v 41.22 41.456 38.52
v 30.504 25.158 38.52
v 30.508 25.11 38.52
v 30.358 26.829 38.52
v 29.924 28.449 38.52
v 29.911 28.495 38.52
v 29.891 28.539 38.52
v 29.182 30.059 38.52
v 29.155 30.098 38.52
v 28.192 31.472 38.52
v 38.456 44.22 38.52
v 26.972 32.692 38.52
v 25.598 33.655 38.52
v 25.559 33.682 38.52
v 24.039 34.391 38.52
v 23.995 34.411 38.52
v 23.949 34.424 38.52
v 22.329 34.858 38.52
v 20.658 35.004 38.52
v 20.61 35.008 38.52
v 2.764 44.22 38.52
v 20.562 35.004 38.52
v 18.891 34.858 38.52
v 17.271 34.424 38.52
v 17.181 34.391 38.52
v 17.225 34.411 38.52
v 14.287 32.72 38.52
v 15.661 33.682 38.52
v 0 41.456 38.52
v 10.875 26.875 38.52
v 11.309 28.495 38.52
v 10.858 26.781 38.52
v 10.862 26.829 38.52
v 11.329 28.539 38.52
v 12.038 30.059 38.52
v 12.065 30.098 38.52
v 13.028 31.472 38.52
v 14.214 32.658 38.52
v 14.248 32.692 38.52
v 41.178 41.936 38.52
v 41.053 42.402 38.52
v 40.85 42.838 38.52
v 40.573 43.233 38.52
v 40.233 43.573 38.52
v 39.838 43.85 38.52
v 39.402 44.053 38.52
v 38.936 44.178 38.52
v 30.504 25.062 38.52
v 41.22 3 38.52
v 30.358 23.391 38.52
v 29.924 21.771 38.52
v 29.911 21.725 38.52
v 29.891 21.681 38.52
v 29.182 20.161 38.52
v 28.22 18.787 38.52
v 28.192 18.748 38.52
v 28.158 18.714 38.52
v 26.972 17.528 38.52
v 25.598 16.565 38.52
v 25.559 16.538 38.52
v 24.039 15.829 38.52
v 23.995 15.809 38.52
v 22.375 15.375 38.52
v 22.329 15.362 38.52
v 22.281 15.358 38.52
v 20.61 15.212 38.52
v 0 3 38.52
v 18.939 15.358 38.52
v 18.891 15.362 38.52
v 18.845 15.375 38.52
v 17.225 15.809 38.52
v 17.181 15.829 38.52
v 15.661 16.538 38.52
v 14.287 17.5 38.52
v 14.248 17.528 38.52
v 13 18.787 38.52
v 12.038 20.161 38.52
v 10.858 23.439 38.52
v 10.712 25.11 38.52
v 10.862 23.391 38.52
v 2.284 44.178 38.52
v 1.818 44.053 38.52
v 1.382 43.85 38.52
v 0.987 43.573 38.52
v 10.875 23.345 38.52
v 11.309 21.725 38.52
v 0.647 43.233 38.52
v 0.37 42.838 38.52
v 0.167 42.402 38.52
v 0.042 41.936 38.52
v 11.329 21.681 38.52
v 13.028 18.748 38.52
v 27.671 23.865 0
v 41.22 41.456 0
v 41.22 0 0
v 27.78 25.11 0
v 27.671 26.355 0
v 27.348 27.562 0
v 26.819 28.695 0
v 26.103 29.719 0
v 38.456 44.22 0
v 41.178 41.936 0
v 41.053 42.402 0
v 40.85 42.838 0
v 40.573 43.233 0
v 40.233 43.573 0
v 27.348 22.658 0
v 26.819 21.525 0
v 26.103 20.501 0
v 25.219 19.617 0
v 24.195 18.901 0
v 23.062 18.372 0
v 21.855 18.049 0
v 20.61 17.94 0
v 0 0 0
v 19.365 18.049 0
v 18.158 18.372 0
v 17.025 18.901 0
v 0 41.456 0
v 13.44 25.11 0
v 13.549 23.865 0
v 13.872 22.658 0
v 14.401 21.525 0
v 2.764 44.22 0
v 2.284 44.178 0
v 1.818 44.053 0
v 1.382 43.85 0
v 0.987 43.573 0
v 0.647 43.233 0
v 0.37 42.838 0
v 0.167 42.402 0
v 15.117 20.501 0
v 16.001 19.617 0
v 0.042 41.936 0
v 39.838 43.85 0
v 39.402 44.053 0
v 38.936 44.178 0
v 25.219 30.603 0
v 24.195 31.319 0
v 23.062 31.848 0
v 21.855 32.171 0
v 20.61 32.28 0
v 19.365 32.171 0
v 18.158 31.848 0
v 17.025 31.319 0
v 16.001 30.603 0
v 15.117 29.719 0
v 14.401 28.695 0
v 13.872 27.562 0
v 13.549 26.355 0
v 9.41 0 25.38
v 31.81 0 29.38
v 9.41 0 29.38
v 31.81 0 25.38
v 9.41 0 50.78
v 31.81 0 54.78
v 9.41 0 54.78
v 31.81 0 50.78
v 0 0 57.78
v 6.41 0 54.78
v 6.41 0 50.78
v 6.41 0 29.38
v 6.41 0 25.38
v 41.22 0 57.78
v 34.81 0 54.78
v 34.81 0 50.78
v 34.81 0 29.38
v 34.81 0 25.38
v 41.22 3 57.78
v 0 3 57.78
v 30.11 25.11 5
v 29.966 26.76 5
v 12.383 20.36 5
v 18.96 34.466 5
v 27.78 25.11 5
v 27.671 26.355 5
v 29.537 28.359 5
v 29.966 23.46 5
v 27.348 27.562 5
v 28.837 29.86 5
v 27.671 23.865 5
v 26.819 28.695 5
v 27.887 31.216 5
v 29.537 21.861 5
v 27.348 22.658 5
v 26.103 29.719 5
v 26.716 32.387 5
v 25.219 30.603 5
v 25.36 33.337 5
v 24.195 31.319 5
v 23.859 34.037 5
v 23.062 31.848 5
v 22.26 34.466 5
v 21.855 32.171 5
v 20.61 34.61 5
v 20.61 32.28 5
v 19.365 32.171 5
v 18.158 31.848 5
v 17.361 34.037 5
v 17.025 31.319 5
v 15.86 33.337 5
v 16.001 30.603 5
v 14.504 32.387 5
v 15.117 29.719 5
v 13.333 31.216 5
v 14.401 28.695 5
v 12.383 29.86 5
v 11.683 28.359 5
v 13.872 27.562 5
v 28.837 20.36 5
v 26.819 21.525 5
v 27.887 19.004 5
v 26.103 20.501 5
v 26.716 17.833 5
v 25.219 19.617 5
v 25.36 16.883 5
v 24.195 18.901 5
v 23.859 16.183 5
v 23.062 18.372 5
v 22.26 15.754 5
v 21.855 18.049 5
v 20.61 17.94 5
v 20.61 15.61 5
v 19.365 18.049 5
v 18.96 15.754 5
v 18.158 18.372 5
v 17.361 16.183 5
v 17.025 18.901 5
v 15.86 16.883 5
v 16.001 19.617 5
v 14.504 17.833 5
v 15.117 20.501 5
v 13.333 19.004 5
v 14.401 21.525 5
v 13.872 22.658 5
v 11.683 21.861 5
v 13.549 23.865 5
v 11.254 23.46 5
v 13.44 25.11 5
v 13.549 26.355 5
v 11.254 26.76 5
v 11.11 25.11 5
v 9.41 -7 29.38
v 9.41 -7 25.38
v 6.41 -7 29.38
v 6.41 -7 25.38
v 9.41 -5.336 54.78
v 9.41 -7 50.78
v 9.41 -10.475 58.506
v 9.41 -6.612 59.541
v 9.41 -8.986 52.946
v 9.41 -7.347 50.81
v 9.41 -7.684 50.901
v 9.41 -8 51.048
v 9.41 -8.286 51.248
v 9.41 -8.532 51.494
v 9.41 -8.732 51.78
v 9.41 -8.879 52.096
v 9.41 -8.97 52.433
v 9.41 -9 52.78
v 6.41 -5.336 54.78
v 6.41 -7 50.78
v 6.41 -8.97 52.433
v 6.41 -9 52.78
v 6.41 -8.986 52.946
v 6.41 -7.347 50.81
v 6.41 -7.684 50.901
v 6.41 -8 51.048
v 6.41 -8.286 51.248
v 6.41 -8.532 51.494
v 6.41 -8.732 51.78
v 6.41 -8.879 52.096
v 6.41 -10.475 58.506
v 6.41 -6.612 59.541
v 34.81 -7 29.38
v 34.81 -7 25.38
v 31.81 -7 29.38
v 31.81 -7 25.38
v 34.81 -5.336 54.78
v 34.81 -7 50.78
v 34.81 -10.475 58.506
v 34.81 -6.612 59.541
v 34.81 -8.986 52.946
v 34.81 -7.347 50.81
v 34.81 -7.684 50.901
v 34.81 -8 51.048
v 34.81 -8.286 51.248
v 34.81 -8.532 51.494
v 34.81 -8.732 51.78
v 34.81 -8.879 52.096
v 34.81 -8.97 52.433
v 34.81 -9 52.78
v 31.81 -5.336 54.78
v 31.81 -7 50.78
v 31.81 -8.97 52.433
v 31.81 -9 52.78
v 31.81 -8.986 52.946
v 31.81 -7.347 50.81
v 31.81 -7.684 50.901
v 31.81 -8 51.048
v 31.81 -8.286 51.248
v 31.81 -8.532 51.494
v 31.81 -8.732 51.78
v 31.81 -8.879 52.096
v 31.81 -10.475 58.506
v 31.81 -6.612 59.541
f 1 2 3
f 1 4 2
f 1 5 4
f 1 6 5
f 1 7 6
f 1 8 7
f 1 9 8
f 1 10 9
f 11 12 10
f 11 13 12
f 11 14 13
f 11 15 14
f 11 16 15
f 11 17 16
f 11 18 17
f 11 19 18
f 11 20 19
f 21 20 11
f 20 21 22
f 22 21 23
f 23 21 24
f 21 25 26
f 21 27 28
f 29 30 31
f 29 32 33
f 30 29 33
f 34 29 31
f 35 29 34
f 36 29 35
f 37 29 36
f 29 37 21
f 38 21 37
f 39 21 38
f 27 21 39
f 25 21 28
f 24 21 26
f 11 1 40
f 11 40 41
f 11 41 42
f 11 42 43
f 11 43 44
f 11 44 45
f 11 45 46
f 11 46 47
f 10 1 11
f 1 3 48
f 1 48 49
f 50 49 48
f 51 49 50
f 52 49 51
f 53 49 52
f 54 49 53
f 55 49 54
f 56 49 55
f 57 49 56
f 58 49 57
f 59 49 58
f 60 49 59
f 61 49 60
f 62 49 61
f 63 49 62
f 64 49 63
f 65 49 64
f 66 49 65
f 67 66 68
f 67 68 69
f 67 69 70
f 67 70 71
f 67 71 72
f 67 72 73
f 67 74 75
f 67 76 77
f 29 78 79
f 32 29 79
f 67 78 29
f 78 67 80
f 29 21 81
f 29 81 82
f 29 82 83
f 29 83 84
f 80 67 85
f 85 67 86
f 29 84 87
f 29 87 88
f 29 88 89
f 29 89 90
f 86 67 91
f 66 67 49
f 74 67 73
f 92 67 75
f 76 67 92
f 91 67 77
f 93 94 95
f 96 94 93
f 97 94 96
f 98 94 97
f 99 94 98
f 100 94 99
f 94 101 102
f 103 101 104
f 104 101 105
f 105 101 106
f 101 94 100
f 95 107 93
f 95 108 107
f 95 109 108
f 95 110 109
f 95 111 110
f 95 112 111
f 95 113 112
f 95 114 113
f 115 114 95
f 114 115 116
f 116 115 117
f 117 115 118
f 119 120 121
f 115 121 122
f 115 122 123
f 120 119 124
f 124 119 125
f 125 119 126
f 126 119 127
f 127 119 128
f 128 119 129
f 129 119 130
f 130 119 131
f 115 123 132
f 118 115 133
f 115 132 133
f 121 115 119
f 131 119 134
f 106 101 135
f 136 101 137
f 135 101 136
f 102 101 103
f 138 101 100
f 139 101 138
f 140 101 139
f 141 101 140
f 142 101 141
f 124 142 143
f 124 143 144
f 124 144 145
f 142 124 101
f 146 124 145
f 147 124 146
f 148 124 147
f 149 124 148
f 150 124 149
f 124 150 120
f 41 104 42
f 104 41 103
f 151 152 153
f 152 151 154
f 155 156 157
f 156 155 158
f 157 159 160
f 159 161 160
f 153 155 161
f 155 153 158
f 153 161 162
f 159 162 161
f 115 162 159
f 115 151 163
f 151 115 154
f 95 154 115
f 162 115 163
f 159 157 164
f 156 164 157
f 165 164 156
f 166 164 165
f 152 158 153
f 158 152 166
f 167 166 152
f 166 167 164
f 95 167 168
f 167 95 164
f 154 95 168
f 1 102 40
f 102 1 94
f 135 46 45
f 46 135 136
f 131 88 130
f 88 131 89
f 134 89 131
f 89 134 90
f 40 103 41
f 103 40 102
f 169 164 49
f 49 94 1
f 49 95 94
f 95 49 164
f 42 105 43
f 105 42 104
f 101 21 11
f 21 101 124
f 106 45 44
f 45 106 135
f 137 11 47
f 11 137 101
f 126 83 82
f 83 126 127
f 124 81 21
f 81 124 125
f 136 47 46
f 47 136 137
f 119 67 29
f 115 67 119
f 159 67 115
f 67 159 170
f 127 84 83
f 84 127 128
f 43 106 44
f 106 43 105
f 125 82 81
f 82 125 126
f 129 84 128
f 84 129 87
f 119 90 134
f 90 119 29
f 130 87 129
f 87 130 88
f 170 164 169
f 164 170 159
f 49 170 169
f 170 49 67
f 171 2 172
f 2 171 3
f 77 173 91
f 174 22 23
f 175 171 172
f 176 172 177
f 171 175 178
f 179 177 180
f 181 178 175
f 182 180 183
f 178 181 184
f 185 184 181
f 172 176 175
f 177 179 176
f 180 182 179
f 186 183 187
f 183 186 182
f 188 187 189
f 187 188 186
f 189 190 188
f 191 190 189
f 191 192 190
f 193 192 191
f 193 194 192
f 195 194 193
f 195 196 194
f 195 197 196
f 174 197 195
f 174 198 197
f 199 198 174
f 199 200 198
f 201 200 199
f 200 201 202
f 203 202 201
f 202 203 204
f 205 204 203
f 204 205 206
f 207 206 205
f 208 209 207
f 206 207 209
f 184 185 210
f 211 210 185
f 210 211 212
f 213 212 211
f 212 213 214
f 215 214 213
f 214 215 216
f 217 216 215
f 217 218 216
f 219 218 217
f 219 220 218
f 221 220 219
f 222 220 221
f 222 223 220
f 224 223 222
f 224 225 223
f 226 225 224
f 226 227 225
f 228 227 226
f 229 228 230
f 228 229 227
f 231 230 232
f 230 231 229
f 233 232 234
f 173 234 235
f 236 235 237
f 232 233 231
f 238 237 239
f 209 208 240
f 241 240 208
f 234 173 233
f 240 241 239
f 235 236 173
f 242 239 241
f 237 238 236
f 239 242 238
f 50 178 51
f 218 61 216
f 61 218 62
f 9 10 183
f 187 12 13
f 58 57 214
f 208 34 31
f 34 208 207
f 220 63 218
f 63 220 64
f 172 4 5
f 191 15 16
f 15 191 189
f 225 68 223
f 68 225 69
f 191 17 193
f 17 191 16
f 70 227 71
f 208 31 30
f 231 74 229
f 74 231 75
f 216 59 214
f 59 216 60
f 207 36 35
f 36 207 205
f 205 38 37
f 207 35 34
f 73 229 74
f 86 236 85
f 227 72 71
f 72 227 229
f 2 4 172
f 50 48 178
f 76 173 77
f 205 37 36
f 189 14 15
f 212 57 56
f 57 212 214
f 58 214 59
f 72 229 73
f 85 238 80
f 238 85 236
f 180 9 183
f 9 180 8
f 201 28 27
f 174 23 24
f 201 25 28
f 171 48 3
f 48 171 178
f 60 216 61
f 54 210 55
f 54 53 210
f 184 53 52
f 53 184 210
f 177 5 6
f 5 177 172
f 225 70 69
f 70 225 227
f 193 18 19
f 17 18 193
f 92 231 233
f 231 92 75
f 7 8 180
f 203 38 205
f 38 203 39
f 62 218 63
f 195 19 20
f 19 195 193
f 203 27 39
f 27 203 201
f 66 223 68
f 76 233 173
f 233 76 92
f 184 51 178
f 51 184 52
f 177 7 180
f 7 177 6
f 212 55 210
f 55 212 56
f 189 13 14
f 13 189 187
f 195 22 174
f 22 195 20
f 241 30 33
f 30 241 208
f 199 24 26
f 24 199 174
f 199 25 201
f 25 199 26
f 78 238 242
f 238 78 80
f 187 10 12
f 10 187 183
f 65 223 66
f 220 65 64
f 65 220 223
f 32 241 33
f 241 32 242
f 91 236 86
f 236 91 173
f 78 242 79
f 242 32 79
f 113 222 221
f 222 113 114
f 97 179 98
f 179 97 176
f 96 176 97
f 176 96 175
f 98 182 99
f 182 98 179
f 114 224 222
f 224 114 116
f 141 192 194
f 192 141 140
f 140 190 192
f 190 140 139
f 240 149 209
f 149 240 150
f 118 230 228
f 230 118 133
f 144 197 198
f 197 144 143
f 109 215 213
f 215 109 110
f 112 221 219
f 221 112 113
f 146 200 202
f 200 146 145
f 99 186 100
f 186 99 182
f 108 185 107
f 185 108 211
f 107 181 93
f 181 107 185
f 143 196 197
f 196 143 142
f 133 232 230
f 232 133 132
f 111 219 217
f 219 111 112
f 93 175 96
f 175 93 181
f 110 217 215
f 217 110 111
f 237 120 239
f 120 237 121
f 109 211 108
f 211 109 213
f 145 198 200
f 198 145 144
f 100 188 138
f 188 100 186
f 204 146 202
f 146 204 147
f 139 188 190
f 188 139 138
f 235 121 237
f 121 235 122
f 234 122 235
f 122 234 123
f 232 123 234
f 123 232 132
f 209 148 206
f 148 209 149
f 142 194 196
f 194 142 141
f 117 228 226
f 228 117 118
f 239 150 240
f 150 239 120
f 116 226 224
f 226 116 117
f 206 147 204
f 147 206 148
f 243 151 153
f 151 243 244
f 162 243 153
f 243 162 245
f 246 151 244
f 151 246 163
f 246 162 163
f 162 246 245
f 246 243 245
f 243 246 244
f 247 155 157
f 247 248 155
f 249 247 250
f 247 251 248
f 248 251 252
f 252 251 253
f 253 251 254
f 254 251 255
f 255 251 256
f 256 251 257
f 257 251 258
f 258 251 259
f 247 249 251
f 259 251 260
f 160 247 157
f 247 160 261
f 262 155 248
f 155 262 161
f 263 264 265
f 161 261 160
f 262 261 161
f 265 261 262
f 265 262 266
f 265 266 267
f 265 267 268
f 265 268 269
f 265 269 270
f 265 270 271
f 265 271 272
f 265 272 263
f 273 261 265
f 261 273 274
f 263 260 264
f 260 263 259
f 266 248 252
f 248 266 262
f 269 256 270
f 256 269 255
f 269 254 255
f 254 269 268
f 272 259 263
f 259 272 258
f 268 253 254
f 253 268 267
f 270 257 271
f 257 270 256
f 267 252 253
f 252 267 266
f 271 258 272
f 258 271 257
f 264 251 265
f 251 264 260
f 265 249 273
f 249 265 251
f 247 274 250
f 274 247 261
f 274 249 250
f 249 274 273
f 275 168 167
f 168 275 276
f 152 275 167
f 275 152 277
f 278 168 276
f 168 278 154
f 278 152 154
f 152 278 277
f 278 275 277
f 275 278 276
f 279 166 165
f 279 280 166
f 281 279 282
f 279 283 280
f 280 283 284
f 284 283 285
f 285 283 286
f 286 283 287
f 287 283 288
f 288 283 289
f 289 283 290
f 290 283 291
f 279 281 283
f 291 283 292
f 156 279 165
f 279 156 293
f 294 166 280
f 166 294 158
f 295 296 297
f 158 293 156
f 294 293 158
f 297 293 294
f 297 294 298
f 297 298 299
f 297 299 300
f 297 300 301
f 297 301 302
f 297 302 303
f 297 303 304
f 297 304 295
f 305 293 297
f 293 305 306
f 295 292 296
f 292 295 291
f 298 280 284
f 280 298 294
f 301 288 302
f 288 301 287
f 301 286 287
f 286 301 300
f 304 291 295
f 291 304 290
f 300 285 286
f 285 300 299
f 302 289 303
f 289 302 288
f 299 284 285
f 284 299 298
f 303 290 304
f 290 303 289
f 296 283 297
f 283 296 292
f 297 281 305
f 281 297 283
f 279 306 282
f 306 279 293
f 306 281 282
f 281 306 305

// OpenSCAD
// -------------------------------------------------------------
// Pegboard screwdriver holder for X pieces
//	By Gilbert Therrien from remix of Jan-Willem
// -------------------------------------------------------------
//   22.11.2015 first version printed
//   02.01.2016 official release on thingiverse

//    25 % infill
//    2 shell (2 x 0.4)
//    Cura and Ultimaker original





/* [tools rack generic parameters] */

// thickness of vertical peg plate
wallY = 3;     // thickness of vertical peg plate

// minimim height for bit hole
toolMinHoleZ = 5;

// space between each screwdrivers
spaceBetweenTools=5;

/* [Parameters for each screwdriver (one value of each screwdriver)] */

// Max diameter for each screwdriver (see diagram)
toolMaxDiam  = [31.22];

// diameter for the up part of the funnel (see diagram)
toolFunnelUpperHoleDiam = [17.82];

// diameter for the bottom part of the funnel (see diagram) 
toolFunnelLowerHoleDiam = [17];

// height of the funnel (see diagram)
toolFunnelZ   = [33.52];

// hole diameter for the screwdriver bit (see diagram)
toolHoleDiam = [12.34];

// to add to holes diameter for loose
loose=2;


/* [hidden] */
inch = 25.4; // distance between peg holes
peghole = 5; // diameter
pegY=7;      // depth of peg pin


// resolution
$fn = 36;
qtTools=len(toolMaxDiam);

holderX=((qtTools + 1) * spaceBetweenTools) + sumv(toolMaxDiam, 0, qtTools - 1);
holderY=max(toolMaxDiam) + wallY + spaceBetweenTools * 2;
holderZ=max(toolFunnelZ) + toolMinHoleZ;
wallZ = holderZ * 1.5 > inch + 7 ? holderZ * 1.5: inch + 7;



/*
// tool set square screwdriver
spaceBetweenTools=10;
toolMaxDiam  = [39, 39, 39, 33];
toolFunnelUpperHoleDiam = [35, 35, 35,29];
toolFunnelLowerHoleDiam = [35, 35, 35, 29];
toolFunnelZ   = [20, 20, 20, 17];
toolHoleDiam = [ 8, 6,5, 8.5, 6.5];
toolMinHoleZ = 5;
*/

// tool set little star
/*
spaceBetweenTools=5;
toolMaxDiam  = [16,33,22];
toolFunnelUpperHoleDiam = [16,30,20];
toolFunnelLowerHoleDiam = [16,30,20];
toolFunnelZ   = [7,15,10];
toolHoleDiam = [3.5,5,6.5];
toolMinHoleZ = 5;
*/


//echo("Number of tools: ", qtTools);
//echo("holderX=", holderX);
//echo("HolderY=", holderY);
//echo("HolderZ=", holderZ);

base();

module base()
{
	// Screwdriver holder
	difference()
	{
		union()
		{
			RoundedBox(holderX, holderY, holderZ, holderY / 16);
			cube([holderX, wallY, wallZ]);
		}

		for (i = [1 : qtTools])
		{
			if(i == 1)
			{
				translate([(toolMaxDiam[i-1]/2) + (i * spaceBetweenTools),
						(holderY - toolFunnelUpperHoleDiam[i-1]) / 2 + (toolFunnelUpperHoleDiam[i-1]/2) + wallY,
						holderZ - toolFunnelZ[i-1]]) 
							cylinder(d1=toolFunnelLowerHoleDiam[i-1] + loose, d2=toolFunnelUpperHoleDiam[i-1] + loose, toolFunnelZ[i-1] + 1);

				translate([(toolMaxDiam[i-1]/2) + (i * spaceBetweenTools) ,
						(holderY - toolFunnelUpperHoleDiam[i-1]) / 2 + (toolFunnelUpperHoleDiam[i-1]/2) + wallY,
						-0.5]) 
							cylinder(d=toolHoleDiam[i-1] + loose, (holderZ - toolFunnelZ[i-1]) + 2);
			}
			else
			{
				translate([(toolMaxDiam[i-1]/2) + (i * spaceBetweenTools) + sumv(toolMaxDiam, 0, i-2) ,
						(holderY - toolFunnelUpperHoleDiam[i-1]) / 2 + (toolFunnelUpperHoleDiam[i-1]/2) + wallY,
						holderZ - toolFunnelZ[i-1]]) 
							cylinder(d1=toolFunnelLowerHoleDiam[i-1] + loose, d2=toolFunnelUpperHoleDiam[i-1] + loose, toolFunnelZ[i-1] + 1);

				translate([(toolMaxDiam[i-1]/2) + (i * spaceBetweenTools) + sumv(toolMaxDiam, 0, i-2),
						(holderY - toolFunnelUpperHoleDiam[i-1]) / 2 + (toolFunnelUpperHoleDiam[i-1]/2) + wallY,
						-0.5]) 
							cylinder(d=toolHoleDiam[i-1] + loose, (holderZ - toolFunnelZ[i-1]) + 2);
			}
		}
	}

	// add Peg pins
	qtPins=floor(holderX / inch);
	widthPins=inch * qtPins + 3;
	firstPinX=(holderX - widthPins) / 2;

	for (x = [firstPinX: inch: holderX])
	{
		echo("x loop:", x);
		pegPins(deltaX=x, deltaZ=wallZ - (inch + 7));
	}
	// bottom
}


module pegPins(delTaX=0, deltaZ=0)
{
	translate([deltaX, -pegY, deltaZ]) cube([3,pegY+wallY,4]);

	// upper pin
	translate([deltaX, -pegY,     deltaZ + inch]) cube([3,pegY+wallY,4]);
	translate([deltaX, -pegY,     deltaZ + inch+2]) rotate([0,90,0]) cylinder(r=4/2, h=3);
	translate([deltaX, -pegY+2.2, deltaZ + inch+2]) rotate([90+15,0,0]) cube([3,pegY,4]);
}


//echo("zeroOrOne(2):", zeroOrOne(2));
// return 1 if value >= 1
function zeroOrOne(value) = (value >= 1 ? 1 : 0);

// return sum v (vector) element from first to last
//echo("sumv([1,2,4])", sumv([1,2,4], 0, 2));
function sumv(v, first=0, last) = (first == last ? v[first] : v[first] + sumv(v, first+1, last));

// -------------------------------------------------------------------
// EmptyBox, JWW, x,y,z,wallY  r=riadius of rounding
// ------------------------------------------------------------------
module EmptyBox(xx,yy,zz,wallY,rr)
{
	difference()
	{
		RoundedBox(xx,yy,zz,rr);
		translate([wallY,wallY,wallY]) RoundedBox(xx-2*wallY,yy-2*wallY,zz,rr-wallY);
	}
}


// ------------------------------------------------------
// Rounded box, JWW, x,y,z  r=riadius of rounding
// ------------------------------------------------------
module RoundedBox(xx,yy,zz,rr)
{
	hull()
	{
		translate([rr,rr,0]) cylinder(r=rr,h=zz);
		translate([rr,yy-rr,0]) cylinder(r=rr,h=zz);
		translate([xx-rr,rr,0]) cylinder(r=rr,h=zz);
		translate([xx-rr,yy-rr,0]) cylinder(r=rr,h=zz);
	}
}
